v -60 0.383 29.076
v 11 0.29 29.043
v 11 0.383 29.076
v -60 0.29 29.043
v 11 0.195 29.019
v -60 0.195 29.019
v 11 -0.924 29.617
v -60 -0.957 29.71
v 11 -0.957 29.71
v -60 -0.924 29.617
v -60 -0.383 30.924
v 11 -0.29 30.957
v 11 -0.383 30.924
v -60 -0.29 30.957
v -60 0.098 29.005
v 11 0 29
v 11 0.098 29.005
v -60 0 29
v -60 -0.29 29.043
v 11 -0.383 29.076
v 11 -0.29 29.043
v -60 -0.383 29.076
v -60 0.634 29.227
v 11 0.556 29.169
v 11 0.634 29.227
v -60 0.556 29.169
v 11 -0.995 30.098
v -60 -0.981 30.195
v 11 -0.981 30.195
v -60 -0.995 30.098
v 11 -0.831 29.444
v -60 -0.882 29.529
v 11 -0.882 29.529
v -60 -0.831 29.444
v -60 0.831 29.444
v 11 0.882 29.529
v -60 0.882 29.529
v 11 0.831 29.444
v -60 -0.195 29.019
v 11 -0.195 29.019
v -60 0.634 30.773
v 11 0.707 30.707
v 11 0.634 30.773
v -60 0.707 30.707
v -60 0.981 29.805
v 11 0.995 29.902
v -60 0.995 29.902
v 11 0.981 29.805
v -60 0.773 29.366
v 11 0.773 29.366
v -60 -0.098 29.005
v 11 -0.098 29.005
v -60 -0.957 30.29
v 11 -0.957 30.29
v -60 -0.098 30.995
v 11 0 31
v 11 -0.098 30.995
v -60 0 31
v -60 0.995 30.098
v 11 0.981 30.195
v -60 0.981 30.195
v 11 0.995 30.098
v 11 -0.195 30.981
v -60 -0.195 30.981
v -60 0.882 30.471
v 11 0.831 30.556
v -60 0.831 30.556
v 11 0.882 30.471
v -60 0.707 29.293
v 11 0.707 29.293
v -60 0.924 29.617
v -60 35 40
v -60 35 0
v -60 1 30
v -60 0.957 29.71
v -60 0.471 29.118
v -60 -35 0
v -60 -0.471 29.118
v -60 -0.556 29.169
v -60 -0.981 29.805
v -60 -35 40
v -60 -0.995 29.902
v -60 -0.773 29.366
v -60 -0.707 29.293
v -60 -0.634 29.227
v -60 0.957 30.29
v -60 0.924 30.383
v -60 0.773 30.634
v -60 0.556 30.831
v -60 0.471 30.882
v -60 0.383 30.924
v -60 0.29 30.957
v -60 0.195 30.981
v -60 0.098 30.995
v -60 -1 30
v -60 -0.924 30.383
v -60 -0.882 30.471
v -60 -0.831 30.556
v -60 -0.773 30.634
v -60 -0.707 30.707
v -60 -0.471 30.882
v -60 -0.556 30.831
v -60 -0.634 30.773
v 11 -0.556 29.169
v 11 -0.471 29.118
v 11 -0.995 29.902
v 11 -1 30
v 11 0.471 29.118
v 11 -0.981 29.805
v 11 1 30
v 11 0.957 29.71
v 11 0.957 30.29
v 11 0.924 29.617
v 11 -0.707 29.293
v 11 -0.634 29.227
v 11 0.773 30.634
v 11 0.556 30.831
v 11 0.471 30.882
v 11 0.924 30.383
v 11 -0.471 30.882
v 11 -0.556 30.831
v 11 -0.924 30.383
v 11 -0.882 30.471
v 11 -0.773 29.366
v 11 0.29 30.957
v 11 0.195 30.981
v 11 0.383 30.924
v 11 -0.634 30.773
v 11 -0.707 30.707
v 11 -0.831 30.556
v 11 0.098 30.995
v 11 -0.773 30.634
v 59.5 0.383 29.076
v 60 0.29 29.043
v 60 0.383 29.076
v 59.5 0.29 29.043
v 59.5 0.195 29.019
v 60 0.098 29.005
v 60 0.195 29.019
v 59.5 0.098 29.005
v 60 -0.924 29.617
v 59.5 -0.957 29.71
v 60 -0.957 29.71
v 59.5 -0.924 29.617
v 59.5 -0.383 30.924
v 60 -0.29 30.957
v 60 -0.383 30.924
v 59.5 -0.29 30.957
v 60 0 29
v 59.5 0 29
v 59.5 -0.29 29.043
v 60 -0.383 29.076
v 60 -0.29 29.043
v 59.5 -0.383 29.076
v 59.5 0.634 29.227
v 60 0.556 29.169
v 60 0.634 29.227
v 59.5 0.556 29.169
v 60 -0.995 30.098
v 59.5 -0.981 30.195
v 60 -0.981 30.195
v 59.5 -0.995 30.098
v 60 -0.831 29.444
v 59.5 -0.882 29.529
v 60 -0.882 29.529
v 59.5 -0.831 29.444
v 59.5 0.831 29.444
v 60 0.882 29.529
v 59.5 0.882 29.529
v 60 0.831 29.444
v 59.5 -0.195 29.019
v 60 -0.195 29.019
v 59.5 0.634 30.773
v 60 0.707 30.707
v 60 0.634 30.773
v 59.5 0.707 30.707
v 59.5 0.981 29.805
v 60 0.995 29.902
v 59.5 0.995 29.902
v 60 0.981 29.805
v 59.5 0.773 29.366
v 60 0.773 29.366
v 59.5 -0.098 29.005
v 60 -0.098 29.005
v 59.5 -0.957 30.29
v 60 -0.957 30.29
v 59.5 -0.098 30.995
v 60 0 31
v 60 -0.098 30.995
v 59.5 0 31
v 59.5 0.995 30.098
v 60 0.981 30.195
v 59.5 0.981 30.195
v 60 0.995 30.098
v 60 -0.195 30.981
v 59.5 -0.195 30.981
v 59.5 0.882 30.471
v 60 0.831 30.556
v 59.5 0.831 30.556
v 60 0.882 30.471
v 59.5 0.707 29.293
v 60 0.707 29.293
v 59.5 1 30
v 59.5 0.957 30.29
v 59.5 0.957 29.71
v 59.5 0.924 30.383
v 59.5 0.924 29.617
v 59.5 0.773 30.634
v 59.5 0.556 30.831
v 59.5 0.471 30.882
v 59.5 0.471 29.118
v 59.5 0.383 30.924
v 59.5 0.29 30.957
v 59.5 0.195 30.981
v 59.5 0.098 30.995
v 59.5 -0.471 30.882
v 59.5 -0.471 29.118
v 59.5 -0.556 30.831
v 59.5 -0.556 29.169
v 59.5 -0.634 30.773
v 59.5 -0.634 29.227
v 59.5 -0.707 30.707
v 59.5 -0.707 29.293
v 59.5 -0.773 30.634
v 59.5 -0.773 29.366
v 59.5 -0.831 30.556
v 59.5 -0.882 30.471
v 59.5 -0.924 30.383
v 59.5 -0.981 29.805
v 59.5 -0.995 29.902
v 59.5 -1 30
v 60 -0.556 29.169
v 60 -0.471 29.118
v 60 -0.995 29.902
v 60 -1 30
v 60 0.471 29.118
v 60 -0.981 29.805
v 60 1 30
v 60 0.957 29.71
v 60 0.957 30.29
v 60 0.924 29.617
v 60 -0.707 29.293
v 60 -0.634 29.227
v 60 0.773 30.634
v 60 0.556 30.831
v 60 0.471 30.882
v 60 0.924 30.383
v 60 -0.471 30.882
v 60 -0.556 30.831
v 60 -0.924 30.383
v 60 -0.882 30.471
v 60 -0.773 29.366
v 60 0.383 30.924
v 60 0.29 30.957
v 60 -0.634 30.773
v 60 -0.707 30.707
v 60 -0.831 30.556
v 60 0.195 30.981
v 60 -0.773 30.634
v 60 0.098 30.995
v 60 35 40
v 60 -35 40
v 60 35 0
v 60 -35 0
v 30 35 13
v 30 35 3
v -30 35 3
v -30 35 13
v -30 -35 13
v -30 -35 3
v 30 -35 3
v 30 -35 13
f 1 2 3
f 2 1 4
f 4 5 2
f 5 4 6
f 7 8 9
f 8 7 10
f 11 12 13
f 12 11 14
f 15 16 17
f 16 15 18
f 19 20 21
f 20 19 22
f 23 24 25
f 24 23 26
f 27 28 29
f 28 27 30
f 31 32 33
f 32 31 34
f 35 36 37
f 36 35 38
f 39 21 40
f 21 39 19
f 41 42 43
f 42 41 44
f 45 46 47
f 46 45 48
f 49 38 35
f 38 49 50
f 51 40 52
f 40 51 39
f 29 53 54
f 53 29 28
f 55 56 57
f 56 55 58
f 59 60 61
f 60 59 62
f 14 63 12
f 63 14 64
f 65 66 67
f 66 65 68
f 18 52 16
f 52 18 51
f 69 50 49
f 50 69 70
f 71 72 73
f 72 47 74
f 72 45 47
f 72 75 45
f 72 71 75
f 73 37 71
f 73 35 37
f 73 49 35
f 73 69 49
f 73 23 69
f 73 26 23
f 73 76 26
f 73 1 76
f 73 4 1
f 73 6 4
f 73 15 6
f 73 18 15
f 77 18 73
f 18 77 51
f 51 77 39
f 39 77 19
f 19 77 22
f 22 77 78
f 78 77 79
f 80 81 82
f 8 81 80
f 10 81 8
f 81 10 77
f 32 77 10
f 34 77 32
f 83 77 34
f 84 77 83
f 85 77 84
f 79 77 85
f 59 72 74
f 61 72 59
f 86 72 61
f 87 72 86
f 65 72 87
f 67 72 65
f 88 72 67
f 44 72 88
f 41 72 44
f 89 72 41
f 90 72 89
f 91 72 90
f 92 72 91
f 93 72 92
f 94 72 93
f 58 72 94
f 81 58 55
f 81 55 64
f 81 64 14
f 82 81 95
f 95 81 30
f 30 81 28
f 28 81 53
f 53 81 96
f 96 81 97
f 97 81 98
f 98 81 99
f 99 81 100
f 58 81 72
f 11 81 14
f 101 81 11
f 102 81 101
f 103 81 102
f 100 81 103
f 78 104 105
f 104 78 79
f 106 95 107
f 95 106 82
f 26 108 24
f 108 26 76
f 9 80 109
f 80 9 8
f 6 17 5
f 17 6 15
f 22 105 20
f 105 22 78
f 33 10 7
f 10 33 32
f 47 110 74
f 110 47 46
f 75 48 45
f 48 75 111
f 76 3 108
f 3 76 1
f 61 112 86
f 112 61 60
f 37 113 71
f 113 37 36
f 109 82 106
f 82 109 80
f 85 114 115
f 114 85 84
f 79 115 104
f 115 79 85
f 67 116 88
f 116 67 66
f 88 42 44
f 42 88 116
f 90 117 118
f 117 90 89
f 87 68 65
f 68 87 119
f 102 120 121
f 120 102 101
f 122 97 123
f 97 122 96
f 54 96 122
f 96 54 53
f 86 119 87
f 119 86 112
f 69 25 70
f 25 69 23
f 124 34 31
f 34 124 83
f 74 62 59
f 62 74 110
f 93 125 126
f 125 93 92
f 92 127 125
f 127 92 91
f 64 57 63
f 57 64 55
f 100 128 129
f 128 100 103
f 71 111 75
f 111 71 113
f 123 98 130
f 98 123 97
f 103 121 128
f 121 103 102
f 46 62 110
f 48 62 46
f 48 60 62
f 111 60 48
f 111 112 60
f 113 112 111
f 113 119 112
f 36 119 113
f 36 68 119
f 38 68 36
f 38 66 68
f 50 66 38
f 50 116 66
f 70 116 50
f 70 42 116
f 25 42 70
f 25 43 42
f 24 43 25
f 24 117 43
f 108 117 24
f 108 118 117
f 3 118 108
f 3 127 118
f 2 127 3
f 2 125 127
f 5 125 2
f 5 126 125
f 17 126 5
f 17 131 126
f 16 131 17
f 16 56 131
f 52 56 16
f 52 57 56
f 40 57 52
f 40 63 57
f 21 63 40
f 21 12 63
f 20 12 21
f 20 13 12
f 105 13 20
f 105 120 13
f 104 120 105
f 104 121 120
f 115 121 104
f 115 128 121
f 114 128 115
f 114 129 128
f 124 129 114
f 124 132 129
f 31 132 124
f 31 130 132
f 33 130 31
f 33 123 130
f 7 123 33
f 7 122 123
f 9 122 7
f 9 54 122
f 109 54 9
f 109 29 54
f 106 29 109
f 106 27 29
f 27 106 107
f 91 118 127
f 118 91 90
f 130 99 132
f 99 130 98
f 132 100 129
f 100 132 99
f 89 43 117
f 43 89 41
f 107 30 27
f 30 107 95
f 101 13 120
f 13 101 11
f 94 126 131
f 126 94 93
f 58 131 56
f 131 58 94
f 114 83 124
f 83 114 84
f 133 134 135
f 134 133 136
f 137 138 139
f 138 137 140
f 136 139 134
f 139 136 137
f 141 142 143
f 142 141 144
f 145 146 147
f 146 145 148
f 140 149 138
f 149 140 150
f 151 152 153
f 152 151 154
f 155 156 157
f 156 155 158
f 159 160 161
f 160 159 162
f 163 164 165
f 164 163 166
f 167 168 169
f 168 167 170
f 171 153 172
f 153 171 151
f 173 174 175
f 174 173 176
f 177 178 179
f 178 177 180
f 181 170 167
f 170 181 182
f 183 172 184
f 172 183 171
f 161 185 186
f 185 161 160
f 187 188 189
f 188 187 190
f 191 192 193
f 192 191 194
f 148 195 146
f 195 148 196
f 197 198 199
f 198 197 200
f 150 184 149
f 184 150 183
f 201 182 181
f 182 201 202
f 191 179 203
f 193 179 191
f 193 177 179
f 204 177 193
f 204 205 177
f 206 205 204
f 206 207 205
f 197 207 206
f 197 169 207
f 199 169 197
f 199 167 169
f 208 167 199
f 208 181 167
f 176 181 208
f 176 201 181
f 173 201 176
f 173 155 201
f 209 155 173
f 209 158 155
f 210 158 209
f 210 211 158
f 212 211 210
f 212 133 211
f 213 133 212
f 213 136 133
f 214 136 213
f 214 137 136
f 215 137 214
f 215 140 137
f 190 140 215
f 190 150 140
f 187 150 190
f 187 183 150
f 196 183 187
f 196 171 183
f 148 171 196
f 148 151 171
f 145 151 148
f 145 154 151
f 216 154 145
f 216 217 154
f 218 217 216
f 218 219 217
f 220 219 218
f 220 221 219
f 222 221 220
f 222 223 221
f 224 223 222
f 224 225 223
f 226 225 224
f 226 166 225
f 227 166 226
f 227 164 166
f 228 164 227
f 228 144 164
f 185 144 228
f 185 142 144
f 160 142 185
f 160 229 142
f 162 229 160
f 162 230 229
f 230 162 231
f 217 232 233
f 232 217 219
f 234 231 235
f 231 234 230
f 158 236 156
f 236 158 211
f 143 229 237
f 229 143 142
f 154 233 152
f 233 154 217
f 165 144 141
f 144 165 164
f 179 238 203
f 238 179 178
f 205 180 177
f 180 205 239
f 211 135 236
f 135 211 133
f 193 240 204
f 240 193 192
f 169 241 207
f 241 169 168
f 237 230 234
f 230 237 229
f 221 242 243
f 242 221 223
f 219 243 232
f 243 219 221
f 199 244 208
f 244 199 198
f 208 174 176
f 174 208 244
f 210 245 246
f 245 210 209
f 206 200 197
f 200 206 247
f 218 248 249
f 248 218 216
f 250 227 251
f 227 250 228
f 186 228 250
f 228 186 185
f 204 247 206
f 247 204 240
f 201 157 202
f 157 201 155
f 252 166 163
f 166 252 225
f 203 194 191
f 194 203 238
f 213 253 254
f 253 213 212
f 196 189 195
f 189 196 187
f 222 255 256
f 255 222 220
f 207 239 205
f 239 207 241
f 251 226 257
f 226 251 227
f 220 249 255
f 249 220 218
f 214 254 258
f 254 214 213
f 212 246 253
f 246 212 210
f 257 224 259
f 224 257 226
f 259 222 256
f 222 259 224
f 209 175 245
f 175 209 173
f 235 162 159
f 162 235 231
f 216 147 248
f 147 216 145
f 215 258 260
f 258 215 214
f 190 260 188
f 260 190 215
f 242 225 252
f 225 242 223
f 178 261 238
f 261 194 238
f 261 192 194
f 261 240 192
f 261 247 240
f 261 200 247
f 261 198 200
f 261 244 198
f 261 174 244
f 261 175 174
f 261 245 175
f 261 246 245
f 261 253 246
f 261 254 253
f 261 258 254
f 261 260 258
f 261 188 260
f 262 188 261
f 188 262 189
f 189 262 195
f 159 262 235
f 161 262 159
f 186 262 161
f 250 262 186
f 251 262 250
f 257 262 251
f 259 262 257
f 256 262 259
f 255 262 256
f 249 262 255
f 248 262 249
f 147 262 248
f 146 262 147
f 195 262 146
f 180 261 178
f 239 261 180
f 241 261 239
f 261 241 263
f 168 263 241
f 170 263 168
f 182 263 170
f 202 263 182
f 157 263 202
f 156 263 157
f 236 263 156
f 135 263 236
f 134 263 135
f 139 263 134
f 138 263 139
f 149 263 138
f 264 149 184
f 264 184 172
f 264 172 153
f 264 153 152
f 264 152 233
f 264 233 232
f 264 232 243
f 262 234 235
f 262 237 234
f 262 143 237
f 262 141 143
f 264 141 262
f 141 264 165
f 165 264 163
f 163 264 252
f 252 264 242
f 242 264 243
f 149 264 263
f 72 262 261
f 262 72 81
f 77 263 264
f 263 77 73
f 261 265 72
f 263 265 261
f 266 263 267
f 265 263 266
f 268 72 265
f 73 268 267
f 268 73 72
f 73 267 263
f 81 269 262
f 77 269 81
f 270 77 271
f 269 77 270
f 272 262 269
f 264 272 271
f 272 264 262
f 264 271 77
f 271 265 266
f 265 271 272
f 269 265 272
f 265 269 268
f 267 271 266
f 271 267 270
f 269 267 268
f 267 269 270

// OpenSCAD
// Mini horizontal gel-electrophoresis box - buffer tank
// Print orientation: tank rests on XY plane, builds upward (+Z)

$fn = 64;

// ---- Tank dimensions ----
tank_x      = 120;   // outer length in X (mm)
tank_y      = 70;    // outer width in Y (mm)
tank_h      = 40;    // outer height in Z (mm)
wall        = 3;     // wall thickness (mm)
floor       = 3;     // floor thickness (mm)

// ---- Platform dimensions ----
plat_x      = 60;    // platform length in X (mm), centred
plat_top_z  = 13;    // platform top height above tank bottom (mm)

// ---- Electrode holes ----
hole_d      = 2;     // horizontal hole diameter (mm)
hole_y      = 0;     // hole centre Y (mm)
hole_z      = 30;    // hole centre Z (mm)

// ---- Derived ----
inner_h = tank_h - floor;   // inner floor height above tank bottom
eps     = 0.5;              // cutter overshoot past faces

difference() {
    // Tank body (open top)
    translate([-tank_x/2, -tank_y/2, 0])
        cube([tank_x, tank_y, tank_h]);

    // Raised platform, full inner width (Y), centred in X
    translate([-plat_x/2, -tank_y/2, floor])
        cube([plat_x, tank_y, plat_top_z - floor]);

    // Horizontal electrode holes through each end wall (along X)
    for (sx = [-1, 1])
        translate([sx > 0 ? tank_x/2 - eps : -tank_x/2, hole_y, hole_z])
            rotate([0, 90, 0])
                cylinder(d = hole_d, h = tank_y + 2*eps);
}
